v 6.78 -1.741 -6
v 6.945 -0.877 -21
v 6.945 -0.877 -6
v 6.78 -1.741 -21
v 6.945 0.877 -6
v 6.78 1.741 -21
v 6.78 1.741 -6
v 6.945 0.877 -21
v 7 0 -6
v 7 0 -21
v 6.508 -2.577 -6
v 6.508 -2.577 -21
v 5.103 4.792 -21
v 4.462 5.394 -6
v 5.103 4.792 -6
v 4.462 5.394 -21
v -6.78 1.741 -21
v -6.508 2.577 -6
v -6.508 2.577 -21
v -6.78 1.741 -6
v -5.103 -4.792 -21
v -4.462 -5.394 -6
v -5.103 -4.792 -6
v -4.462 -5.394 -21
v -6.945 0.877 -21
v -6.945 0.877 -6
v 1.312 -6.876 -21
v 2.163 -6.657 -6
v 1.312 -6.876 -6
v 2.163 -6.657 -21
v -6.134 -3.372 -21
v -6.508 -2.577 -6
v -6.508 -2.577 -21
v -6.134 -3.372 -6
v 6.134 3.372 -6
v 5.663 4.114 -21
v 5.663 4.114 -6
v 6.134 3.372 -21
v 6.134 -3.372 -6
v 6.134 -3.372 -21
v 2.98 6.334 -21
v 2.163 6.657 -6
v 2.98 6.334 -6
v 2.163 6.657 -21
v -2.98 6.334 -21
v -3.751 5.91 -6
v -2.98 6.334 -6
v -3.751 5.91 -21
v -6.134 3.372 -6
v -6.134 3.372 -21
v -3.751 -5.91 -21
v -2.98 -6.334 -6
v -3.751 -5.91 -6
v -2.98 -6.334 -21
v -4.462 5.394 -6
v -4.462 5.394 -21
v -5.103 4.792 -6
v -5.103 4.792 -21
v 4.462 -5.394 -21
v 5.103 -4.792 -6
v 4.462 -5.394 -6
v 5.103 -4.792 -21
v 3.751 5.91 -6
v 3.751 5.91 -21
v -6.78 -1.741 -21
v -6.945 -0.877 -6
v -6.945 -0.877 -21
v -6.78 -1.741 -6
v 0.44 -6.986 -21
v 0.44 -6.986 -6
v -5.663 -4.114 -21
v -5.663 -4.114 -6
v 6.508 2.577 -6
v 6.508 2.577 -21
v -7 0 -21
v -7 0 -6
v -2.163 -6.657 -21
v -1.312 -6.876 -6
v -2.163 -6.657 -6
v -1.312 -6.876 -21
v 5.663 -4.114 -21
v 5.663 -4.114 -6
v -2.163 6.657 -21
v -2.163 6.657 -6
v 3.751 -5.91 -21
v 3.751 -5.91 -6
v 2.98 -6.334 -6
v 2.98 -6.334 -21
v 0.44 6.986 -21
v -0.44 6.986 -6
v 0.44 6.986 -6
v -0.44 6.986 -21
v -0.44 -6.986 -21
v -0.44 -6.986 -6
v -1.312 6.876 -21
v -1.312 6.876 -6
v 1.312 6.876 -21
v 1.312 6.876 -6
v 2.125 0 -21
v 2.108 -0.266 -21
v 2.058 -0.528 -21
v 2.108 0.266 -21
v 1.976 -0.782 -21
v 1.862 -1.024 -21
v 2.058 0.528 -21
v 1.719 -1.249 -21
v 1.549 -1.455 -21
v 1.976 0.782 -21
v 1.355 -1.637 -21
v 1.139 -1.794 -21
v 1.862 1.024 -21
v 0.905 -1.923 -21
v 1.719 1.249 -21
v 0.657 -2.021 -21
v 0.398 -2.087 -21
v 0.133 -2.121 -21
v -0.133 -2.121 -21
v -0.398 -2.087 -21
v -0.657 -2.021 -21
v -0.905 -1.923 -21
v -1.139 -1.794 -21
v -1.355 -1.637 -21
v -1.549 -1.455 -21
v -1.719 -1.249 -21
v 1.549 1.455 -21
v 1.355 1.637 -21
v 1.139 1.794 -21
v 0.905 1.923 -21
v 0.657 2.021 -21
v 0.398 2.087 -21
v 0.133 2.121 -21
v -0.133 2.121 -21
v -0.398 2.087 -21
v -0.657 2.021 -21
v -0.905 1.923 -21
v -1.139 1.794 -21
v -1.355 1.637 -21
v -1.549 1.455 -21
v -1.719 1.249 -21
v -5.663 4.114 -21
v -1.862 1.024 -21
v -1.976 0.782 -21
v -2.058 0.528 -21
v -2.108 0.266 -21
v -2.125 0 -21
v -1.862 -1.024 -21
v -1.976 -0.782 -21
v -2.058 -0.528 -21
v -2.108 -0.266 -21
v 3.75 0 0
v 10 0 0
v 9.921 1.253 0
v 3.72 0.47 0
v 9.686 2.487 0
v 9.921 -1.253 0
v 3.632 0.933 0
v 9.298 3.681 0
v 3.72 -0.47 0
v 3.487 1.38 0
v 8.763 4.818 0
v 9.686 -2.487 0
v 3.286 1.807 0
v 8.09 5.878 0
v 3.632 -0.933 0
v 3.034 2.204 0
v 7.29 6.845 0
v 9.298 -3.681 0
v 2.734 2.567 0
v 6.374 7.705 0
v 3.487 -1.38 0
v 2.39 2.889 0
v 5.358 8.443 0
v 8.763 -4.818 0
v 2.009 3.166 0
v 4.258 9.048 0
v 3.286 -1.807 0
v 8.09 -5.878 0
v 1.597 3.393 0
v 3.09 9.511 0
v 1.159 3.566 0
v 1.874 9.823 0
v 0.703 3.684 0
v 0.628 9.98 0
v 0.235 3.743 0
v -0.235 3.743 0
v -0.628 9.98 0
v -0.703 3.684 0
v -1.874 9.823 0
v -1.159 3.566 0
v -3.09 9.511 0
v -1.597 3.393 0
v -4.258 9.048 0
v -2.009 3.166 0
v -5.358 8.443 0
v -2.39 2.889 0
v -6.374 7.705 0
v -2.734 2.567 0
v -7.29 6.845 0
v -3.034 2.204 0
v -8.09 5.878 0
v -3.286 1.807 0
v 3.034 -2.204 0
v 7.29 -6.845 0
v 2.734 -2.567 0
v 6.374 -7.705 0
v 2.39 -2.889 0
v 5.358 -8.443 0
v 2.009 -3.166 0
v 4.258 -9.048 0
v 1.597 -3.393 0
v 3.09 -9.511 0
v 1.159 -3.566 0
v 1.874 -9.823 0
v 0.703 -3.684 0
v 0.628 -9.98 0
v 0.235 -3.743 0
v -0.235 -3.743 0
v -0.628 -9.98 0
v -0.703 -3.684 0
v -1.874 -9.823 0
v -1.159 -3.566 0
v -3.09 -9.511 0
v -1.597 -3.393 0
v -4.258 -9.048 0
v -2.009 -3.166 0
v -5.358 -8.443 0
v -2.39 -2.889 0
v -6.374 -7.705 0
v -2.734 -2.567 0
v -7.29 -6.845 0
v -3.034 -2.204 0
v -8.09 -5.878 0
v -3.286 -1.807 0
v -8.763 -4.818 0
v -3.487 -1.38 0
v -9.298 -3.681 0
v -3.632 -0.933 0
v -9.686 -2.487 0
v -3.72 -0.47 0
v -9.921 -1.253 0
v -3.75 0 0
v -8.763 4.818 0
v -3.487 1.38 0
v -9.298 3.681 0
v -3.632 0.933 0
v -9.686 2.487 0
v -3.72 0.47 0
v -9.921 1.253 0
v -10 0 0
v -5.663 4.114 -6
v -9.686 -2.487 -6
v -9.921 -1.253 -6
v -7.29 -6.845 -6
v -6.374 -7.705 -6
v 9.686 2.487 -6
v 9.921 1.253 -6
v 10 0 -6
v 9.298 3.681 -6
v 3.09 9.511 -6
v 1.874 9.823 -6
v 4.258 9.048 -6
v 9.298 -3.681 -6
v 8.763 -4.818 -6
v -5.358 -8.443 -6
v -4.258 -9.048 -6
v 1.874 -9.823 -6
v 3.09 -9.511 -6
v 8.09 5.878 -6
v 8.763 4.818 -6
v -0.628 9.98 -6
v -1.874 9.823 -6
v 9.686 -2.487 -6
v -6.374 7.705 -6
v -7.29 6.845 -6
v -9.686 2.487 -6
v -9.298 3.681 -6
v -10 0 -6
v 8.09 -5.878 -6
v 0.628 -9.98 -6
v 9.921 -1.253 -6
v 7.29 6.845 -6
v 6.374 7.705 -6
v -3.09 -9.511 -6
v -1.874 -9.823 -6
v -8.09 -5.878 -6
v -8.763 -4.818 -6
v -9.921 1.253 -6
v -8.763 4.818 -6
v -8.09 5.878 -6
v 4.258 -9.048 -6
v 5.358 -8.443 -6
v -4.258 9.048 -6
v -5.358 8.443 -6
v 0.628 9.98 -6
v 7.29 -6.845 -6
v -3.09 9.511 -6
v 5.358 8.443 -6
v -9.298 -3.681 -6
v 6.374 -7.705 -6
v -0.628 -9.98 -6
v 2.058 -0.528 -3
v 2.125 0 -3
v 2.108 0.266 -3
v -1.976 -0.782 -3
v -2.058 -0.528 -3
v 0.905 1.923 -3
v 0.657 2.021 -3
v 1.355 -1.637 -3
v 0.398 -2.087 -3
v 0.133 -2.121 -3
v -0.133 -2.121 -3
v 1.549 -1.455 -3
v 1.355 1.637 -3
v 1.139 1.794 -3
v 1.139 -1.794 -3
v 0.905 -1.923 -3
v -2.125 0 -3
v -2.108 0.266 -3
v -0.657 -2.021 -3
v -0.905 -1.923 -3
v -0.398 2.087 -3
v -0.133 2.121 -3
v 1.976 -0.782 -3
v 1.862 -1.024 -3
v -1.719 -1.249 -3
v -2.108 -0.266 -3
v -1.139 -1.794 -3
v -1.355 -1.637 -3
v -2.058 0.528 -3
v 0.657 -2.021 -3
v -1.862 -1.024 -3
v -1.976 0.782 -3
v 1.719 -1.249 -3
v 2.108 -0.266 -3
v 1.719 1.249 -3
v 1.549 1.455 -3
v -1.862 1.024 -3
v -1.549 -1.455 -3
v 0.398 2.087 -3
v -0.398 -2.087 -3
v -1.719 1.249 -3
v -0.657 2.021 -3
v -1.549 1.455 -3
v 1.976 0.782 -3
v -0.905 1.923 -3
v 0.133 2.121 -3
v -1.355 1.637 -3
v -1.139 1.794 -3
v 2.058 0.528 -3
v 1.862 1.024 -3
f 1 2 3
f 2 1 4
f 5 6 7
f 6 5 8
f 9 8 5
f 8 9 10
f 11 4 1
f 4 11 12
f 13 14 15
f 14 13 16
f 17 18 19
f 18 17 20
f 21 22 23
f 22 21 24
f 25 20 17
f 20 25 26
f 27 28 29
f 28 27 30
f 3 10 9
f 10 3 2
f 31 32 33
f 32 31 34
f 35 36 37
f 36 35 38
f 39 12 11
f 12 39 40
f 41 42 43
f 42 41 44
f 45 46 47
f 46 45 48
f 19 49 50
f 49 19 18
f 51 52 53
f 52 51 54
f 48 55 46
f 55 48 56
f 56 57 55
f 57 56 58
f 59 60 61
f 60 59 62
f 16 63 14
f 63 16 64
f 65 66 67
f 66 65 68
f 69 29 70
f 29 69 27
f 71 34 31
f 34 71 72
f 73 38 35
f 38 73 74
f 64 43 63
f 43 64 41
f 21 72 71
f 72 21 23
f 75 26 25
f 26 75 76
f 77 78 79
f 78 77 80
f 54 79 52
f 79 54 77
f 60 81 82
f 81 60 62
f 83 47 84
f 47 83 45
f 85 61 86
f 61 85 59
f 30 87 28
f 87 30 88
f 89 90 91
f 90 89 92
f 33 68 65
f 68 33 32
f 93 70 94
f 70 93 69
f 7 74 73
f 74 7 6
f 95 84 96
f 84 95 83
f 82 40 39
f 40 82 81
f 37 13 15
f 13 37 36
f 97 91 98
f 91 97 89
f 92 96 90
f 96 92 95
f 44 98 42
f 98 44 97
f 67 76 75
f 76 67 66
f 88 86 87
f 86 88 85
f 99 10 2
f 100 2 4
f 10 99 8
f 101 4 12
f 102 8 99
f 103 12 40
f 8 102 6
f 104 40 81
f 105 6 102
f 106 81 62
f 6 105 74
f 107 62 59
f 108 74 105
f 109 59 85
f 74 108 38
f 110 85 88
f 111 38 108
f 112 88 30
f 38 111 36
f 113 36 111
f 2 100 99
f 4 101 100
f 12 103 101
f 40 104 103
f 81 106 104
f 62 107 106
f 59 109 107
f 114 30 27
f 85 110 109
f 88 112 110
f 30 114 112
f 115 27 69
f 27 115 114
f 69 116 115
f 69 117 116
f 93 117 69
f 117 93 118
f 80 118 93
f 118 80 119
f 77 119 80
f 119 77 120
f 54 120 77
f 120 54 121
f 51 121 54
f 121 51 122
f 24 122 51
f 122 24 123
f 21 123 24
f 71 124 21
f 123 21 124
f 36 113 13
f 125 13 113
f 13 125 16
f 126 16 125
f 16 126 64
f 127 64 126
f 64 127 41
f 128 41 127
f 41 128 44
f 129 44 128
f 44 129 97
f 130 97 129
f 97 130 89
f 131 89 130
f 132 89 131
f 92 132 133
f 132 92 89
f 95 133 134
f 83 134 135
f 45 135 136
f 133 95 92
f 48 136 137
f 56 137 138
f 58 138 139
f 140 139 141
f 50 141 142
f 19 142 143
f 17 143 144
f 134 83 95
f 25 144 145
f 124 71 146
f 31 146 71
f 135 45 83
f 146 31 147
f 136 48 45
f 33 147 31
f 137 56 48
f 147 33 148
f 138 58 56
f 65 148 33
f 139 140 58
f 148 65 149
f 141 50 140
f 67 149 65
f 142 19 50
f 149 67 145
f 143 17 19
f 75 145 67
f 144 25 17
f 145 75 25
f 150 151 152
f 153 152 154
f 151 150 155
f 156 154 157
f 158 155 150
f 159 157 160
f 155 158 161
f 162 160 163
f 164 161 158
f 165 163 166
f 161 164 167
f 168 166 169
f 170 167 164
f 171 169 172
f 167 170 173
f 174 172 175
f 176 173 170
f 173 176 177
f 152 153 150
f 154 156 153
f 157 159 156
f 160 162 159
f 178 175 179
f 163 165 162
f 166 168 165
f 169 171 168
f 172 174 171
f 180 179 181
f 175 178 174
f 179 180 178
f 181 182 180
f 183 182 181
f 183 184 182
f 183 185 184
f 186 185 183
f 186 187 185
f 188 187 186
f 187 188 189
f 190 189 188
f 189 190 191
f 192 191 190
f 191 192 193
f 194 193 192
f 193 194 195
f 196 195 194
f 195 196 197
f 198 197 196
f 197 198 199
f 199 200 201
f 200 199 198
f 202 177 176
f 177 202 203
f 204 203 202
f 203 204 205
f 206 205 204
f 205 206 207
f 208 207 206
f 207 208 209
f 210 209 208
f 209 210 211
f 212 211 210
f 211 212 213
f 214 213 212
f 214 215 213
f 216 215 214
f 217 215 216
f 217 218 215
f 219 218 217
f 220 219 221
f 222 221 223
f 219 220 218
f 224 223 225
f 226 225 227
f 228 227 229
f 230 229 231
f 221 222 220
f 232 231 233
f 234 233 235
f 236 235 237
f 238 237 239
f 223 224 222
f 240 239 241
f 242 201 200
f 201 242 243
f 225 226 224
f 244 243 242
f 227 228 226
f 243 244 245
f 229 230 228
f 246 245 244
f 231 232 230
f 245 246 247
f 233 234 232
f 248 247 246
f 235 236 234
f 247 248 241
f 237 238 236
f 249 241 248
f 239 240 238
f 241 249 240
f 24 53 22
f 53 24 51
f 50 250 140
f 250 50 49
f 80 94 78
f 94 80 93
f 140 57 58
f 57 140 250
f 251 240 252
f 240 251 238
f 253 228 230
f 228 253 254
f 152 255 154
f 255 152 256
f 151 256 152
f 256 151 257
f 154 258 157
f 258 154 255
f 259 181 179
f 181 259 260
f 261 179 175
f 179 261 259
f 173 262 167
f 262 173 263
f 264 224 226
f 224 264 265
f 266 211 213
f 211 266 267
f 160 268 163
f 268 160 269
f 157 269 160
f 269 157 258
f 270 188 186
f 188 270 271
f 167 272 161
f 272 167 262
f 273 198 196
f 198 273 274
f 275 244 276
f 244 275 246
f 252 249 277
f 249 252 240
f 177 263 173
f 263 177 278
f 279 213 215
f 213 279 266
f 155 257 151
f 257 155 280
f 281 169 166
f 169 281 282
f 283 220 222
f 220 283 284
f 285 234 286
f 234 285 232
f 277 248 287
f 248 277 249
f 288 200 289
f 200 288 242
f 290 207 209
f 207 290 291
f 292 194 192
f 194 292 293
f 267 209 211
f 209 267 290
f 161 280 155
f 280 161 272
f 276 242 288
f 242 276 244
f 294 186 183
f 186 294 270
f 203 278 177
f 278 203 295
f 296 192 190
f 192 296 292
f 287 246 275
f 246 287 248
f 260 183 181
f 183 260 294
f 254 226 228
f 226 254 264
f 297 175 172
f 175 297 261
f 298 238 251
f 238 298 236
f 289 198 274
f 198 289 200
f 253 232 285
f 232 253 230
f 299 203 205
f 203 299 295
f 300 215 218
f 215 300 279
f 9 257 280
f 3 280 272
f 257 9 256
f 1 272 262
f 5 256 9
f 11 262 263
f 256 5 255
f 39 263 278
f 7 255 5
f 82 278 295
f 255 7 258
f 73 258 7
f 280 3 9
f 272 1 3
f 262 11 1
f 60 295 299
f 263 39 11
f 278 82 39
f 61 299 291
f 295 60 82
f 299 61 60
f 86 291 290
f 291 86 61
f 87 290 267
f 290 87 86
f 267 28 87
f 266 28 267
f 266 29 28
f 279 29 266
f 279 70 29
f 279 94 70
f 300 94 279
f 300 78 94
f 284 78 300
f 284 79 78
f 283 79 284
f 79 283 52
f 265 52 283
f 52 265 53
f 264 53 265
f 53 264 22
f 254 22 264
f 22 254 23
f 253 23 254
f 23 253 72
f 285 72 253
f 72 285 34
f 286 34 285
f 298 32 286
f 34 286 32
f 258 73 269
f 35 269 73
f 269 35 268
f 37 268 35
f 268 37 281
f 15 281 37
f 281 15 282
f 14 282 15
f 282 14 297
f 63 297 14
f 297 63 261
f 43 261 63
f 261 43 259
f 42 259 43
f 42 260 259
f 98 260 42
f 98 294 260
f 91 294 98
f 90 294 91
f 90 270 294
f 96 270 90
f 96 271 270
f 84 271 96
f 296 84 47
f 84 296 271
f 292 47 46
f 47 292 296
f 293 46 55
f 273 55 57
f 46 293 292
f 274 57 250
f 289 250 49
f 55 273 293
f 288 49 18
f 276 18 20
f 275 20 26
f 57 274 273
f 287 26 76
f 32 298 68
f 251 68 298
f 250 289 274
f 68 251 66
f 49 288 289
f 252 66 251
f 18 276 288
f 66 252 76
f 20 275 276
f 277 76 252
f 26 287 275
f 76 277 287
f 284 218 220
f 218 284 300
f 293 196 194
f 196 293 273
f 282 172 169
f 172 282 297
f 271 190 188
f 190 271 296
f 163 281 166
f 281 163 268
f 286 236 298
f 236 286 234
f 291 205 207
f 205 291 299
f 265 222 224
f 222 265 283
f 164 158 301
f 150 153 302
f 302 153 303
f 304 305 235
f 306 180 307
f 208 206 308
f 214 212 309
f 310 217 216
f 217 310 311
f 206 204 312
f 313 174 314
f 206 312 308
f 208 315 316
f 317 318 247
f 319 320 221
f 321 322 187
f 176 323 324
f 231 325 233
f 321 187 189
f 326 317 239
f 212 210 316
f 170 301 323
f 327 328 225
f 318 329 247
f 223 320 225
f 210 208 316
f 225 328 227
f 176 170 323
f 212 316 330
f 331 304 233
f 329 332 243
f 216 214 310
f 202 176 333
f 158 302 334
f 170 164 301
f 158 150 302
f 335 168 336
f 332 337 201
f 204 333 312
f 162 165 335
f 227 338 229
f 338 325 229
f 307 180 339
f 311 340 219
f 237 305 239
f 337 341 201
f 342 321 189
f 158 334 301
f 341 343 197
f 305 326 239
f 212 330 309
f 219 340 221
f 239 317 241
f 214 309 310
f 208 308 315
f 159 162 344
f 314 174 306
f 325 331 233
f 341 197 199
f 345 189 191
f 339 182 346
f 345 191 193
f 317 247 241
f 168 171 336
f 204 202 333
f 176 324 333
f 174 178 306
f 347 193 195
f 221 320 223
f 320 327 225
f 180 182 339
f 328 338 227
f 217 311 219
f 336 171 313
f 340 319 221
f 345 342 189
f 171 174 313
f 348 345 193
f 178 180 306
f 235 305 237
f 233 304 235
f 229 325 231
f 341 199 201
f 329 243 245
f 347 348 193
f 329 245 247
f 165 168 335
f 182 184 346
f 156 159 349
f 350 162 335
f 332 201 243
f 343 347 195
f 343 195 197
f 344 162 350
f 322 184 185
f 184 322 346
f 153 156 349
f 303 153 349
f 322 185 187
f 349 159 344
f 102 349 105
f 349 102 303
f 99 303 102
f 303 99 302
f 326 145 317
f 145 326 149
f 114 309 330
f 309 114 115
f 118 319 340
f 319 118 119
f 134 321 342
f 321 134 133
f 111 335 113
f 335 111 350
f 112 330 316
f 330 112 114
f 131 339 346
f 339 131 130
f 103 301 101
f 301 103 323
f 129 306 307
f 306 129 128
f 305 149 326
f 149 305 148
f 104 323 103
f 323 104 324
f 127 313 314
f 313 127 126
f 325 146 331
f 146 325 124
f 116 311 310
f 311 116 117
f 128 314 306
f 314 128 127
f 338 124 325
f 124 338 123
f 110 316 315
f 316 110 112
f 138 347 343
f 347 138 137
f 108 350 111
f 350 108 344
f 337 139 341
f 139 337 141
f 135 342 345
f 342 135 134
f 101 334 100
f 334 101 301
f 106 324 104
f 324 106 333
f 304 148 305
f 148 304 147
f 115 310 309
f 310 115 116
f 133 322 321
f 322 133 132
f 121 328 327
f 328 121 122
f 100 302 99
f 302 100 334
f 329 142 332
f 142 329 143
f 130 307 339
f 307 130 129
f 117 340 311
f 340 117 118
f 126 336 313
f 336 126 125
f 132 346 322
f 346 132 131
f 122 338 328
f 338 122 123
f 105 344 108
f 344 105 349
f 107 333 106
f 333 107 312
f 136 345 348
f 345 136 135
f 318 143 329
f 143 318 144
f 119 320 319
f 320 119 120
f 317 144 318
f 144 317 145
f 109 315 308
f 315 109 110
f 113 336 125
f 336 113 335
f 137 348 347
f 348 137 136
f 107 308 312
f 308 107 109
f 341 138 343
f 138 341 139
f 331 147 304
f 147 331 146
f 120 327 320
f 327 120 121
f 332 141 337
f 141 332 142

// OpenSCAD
$fn = 50;


difference() {
	union() {
		translate(v = [0, 0, -21.0000000000]) {
			cylinder(h = 21, r = 7.0000000000);
		}
		translate(v = [0, 0, -6.0000000000]) {
			cylinder(h = 6, r = 10.0000000000);
		}
	}
	union() {
		translate(v = [0, 0, 0]) {
			rotate(a = [0, 0, 0]) {
				difference() {
					union() {
						#translate(v = [0, 0, -21.0000000000]) {
							cylinder(h = 21, r = 2.0000000000);
						}
						#translate(v = [0, 0, -3]) {
							cylinder(h = 3, r1 = 2.1250000000, r2 = 3.7500000000);
						}
						#translate(v = [0, 0, -21.0000000000]) {
							cylinder(h = 21, r = 2.1250000000);
						}
						#translate(v = [0, 0, -21.0000000000]) {
							cylinder(h = 21, r = 2.0000000000);
						}
					}
					union();
				}
			}
		}
	}
}
